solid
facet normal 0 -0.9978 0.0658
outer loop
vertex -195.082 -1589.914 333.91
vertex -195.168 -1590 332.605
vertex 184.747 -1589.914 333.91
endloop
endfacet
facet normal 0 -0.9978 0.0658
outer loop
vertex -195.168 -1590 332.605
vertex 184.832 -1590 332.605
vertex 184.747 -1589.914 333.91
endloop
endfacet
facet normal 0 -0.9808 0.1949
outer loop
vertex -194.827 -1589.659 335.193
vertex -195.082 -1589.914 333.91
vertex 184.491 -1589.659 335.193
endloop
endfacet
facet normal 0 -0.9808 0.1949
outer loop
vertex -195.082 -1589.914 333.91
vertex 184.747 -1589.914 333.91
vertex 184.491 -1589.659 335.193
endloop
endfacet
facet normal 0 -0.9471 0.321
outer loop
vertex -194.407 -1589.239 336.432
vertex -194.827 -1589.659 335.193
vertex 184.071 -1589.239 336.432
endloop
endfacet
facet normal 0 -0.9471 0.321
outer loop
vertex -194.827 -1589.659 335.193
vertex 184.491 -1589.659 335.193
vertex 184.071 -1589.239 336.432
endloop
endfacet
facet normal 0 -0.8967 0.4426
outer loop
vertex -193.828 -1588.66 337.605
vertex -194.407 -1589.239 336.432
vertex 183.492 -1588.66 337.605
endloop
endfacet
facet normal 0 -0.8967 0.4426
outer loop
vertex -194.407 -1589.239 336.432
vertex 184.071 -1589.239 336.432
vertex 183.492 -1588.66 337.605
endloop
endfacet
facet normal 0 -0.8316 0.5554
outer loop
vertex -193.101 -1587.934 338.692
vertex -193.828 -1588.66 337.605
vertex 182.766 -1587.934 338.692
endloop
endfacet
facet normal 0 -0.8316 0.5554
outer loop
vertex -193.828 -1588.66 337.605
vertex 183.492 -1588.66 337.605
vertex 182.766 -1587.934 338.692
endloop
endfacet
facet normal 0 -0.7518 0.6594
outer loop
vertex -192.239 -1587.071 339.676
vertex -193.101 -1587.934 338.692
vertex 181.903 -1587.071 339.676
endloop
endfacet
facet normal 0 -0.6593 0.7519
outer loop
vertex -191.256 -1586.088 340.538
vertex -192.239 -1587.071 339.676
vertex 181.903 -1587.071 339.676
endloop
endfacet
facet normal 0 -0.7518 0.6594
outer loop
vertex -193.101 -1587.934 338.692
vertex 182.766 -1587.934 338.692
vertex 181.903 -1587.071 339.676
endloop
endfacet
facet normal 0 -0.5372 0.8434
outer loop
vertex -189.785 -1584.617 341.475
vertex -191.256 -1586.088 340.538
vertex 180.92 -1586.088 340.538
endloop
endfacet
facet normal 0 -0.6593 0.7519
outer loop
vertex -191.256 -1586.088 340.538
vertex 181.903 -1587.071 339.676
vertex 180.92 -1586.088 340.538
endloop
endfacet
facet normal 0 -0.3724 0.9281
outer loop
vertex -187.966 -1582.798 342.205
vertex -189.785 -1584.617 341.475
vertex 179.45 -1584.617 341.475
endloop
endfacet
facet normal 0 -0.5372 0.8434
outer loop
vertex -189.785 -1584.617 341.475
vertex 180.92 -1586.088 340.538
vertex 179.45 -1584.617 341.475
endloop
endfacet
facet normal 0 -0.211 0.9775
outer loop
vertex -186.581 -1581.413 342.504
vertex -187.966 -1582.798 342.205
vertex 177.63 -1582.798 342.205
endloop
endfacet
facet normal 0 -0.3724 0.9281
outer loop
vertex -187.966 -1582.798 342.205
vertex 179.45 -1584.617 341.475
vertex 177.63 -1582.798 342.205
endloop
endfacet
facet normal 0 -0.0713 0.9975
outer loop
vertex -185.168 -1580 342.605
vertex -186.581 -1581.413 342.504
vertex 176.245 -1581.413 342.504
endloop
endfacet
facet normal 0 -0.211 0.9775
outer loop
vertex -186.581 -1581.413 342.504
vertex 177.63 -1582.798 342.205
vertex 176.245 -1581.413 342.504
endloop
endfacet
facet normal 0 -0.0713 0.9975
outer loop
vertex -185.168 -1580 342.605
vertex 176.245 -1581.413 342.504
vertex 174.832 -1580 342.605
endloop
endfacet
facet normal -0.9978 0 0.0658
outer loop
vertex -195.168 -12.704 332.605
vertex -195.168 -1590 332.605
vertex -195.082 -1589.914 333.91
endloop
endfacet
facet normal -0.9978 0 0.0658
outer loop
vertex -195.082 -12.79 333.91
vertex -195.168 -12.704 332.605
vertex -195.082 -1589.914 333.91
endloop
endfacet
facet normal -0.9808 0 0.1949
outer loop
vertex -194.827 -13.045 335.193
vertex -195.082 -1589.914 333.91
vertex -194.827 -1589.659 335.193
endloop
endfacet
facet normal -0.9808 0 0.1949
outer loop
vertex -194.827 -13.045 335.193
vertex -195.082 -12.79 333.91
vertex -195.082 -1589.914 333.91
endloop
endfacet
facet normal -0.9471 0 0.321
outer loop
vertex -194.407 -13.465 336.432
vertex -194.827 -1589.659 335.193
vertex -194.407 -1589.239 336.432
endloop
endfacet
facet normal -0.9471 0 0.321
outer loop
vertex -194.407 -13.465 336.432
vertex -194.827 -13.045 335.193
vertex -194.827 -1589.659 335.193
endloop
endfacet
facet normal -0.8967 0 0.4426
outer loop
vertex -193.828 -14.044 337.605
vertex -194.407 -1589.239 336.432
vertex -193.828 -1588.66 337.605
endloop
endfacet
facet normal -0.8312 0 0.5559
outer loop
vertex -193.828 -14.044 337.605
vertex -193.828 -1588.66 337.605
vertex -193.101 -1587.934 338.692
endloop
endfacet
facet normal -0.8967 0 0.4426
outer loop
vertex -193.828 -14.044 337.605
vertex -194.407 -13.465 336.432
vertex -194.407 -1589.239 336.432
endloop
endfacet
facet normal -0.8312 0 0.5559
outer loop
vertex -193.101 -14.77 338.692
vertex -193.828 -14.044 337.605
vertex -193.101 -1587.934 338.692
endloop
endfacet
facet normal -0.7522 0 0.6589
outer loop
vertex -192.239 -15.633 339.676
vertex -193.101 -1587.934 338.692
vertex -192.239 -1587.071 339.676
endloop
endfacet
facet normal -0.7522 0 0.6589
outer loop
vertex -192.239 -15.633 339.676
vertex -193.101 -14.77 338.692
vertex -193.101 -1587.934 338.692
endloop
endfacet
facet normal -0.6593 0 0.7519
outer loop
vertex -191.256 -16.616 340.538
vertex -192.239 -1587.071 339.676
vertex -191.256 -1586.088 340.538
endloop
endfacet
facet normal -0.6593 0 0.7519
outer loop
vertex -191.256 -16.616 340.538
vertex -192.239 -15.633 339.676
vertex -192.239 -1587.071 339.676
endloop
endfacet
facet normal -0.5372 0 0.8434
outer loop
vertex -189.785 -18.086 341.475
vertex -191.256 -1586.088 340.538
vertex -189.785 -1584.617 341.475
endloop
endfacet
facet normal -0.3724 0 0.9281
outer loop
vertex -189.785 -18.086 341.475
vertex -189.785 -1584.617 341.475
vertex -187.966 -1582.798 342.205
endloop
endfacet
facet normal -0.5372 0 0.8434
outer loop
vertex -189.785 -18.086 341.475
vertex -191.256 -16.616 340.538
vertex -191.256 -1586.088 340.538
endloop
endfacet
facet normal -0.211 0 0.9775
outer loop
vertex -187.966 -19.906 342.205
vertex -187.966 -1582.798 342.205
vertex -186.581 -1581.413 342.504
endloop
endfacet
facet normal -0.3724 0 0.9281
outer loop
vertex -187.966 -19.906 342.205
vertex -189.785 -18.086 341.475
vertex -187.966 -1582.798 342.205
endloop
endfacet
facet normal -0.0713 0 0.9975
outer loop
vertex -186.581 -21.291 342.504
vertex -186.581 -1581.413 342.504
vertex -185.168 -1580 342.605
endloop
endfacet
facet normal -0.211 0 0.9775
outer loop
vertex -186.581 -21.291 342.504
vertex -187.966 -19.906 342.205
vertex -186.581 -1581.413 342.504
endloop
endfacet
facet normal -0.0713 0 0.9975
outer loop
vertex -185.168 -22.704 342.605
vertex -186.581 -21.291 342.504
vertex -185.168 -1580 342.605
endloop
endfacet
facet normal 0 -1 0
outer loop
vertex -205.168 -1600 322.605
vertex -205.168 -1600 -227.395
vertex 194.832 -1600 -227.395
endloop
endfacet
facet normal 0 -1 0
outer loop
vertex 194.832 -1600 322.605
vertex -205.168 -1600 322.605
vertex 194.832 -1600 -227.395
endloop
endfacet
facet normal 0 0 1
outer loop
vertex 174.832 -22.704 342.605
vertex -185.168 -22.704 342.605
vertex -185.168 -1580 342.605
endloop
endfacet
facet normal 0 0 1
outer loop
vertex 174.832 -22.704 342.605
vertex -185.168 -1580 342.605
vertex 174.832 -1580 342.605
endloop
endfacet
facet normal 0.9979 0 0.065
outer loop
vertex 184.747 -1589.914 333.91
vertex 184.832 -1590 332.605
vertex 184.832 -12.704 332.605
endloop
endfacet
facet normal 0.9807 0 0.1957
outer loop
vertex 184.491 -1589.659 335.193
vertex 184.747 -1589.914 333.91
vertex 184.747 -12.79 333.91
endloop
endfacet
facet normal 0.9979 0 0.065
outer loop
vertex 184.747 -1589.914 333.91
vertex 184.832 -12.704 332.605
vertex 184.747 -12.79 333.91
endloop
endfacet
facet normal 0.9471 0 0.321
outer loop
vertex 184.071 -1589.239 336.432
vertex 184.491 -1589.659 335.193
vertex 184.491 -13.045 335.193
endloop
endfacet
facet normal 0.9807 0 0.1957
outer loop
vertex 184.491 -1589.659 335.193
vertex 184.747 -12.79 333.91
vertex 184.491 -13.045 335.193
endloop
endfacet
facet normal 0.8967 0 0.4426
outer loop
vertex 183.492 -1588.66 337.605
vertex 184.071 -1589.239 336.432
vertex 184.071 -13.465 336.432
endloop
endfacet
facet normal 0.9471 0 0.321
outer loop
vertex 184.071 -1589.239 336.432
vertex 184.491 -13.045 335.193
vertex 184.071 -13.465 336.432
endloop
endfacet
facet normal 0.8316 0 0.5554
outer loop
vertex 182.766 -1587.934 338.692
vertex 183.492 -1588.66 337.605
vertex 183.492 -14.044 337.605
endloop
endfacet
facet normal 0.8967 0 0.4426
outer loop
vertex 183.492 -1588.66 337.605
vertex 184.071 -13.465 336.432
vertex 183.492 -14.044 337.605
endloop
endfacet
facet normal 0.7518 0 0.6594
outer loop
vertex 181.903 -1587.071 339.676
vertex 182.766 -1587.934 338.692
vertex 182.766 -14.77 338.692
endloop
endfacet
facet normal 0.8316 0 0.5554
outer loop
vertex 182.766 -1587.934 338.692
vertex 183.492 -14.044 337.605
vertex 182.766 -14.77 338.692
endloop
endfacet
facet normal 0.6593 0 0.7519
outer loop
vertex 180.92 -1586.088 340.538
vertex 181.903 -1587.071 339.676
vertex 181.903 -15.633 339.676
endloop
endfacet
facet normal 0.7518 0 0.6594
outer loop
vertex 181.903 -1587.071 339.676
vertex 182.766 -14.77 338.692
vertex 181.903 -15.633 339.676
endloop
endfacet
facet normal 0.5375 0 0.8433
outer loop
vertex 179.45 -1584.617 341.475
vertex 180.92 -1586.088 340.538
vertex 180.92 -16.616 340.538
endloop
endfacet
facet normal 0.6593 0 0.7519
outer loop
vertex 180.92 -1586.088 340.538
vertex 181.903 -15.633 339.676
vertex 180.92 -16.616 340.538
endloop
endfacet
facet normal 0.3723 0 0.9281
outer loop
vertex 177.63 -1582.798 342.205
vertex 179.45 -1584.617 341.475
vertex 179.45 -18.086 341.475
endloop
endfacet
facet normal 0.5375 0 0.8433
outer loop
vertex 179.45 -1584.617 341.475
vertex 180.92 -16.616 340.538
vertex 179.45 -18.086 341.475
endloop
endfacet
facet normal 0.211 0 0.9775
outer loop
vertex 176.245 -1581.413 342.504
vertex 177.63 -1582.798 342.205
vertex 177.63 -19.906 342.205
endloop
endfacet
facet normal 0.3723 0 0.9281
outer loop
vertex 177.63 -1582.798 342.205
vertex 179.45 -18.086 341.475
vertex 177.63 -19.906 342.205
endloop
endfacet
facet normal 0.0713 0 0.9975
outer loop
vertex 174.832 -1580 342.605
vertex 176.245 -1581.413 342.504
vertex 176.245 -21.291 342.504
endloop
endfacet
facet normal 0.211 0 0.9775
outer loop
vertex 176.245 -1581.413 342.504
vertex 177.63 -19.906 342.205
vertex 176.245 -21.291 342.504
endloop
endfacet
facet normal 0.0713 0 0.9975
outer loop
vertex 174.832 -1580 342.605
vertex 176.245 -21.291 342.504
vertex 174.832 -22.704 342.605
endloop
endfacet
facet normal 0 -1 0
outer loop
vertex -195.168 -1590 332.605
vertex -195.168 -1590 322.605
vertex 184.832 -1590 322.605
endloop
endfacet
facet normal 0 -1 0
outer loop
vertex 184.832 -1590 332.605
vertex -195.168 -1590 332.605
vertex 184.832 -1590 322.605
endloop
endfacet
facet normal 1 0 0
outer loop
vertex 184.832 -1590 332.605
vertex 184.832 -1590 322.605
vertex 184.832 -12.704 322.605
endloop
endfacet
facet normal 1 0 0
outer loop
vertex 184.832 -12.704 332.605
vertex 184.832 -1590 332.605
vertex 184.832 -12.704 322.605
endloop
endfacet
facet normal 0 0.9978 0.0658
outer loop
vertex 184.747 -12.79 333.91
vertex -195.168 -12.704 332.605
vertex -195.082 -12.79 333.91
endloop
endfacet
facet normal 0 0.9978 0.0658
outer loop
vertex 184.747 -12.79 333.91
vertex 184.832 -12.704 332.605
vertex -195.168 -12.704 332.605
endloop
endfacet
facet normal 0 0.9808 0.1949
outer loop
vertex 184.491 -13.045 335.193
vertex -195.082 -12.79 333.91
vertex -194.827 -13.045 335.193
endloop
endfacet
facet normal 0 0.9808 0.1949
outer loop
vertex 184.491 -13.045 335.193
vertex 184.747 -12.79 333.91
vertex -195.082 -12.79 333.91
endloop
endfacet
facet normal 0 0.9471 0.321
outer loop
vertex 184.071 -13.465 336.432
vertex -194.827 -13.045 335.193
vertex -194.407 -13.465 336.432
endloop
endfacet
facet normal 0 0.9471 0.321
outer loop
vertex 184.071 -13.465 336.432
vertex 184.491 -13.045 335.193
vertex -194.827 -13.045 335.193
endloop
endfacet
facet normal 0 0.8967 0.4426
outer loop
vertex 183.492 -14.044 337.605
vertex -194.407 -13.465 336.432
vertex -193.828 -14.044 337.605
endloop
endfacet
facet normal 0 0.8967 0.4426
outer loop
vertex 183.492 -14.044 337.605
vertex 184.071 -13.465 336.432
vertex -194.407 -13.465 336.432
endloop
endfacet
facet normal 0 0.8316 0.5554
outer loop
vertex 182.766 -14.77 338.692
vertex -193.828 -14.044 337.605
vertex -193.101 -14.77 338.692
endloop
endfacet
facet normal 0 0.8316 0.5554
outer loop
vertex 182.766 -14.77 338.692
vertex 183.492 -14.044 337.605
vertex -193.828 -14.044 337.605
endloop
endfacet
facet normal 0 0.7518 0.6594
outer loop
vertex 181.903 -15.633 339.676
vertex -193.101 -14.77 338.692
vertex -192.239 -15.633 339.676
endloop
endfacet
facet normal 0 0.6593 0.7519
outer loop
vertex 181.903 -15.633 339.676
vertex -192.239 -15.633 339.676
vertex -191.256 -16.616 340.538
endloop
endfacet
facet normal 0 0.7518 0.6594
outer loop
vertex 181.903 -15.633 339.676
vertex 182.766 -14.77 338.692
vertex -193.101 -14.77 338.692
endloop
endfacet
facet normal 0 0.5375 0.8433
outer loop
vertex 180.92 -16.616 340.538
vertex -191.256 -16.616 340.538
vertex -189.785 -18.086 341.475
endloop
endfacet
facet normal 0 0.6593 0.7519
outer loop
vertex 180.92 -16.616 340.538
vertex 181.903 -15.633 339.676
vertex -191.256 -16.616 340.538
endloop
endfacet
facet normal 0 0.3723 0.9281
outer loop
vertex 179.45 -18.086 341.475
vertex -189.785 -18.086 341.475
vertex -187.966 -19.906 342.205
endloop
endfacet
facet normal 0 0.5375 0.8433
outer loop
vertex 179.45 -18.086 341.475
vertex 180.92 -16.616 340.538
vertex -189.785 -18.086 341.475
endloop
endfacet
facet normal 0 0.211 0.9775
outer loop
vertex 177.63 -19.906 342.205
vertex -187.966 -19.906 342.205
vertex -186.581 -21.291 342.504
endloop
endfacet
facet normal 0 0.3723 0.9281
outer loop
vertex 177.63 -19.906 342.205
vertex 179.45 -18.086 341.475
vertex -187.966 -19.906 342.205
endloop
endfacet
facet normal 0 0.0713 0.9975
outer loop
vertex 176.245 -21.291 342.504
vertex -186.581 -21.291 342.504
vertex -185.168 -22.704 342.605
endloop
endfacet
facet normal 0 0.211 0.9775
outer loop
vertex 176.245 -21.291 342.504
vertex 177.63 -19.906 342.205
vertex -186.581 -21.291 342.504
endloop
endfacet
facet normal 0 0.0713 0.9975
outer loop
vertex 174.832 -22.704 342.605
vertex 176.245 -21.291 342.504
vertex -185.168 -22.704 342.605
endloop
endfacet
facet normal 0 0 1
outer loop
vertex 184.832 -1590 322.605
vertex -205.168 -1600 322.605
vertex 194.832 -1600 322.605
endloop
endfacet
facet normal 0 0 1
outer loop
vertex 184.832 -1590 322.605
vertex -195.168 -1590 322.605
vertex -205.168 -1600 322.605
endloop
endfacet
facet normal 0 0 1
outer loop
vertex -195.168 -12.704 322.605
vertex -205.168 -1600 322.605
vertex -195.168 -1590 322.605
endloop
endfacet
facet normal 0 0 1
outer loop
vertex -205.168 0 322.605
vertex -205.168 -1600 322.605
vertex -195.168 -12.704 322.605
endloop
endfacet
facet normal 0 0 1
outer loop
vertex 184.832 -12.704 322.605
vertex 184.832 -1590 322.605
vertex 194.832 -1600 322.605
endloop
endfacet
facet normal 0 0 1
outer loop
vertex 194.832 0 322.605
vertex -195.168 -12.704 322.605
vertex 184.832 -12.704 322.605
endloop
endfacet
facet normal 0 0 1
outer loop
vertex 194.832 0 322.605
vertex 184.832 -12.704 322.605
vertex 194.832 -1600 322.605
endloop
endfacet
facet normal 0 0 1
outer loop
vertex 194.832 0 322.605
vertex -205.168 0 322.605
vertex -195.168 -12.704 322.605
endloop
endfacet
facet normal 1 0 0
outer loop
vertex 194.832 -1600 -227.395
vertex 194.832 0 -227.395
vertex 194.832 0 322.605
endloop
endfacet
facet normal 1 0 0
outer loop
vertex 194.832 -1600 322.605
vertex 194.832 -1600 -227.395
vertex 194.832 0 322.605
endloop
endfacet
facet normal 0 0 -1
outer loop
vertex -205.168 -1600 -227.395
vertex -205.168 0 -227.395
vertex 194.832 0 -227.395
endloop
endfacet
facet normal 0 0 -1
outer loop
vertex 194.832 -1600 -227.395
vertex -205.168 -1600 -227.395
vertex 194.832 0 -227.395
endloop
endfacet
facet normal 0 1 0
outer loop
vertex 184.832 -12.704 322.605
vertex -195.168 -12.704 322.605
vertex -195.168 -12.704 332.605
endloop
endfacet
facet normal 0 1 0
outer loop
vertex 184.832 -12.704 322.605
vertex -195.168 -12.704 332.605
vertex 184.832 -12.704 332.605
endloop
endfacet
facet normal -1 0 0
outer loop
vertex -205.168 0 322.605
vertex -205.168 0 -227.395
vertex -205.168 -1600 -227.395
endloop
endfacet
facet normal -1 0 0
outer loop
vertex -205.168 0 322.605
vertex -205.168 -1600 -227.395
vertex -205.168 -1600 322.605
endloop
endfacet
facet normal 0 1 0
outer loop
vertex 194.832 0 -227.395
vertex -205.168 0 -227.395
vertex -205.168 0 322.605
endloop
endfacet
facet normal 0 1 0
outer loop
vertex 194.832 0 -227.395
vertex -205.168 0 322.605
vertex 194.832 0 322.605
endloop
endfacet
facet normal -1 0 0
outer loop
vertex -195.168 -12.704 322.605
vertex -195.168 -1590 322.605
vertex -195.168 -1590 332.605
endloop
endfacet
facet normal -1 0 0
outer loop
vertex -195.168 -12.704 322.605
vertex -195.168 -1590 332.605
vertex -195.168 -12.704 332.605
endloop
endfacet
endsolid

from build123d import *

# Parameters (mm, degrees)
F0_W     = 400
F0_H     = 550
F1_DEPTH = 1600
F2_W     = 380
F2_H     = 1577.29602
F3_DEPTH = 20
F4_R     = 10


with BuildPart() as f1:
    # F0 (on Front) → F1 (new body)
    with BuildSketch(Plane.XZ):
        with Locations((-5.16789, 47.604696)):
            Rectangle(F0_W, F0_H)
    extrude(amount=F1_DEPTH)

    # F2 (on face) → F3 (join)
    with BuildSketch(Plane.XY.offset(322.604696)):
        with Locations((-5.16789, -801.35199)):
            Rectangle(F2_W, F2_H)
    extrude(amount=F3_DEPTH)

    # F4
    f4_edges = [f1.edges().sort_by_distance(p)[0] for p in [
        (-5.16789, -12.70398, 342.604696),
        (-195.16789, -801.35199, 342.604696),
        (-5.16789, -1590, 342.604696),
        (184.83211, -801.35199, 342.604696),
    ]]
    fillet(f4_edges, radius=F4_R)


solid = f1.part
